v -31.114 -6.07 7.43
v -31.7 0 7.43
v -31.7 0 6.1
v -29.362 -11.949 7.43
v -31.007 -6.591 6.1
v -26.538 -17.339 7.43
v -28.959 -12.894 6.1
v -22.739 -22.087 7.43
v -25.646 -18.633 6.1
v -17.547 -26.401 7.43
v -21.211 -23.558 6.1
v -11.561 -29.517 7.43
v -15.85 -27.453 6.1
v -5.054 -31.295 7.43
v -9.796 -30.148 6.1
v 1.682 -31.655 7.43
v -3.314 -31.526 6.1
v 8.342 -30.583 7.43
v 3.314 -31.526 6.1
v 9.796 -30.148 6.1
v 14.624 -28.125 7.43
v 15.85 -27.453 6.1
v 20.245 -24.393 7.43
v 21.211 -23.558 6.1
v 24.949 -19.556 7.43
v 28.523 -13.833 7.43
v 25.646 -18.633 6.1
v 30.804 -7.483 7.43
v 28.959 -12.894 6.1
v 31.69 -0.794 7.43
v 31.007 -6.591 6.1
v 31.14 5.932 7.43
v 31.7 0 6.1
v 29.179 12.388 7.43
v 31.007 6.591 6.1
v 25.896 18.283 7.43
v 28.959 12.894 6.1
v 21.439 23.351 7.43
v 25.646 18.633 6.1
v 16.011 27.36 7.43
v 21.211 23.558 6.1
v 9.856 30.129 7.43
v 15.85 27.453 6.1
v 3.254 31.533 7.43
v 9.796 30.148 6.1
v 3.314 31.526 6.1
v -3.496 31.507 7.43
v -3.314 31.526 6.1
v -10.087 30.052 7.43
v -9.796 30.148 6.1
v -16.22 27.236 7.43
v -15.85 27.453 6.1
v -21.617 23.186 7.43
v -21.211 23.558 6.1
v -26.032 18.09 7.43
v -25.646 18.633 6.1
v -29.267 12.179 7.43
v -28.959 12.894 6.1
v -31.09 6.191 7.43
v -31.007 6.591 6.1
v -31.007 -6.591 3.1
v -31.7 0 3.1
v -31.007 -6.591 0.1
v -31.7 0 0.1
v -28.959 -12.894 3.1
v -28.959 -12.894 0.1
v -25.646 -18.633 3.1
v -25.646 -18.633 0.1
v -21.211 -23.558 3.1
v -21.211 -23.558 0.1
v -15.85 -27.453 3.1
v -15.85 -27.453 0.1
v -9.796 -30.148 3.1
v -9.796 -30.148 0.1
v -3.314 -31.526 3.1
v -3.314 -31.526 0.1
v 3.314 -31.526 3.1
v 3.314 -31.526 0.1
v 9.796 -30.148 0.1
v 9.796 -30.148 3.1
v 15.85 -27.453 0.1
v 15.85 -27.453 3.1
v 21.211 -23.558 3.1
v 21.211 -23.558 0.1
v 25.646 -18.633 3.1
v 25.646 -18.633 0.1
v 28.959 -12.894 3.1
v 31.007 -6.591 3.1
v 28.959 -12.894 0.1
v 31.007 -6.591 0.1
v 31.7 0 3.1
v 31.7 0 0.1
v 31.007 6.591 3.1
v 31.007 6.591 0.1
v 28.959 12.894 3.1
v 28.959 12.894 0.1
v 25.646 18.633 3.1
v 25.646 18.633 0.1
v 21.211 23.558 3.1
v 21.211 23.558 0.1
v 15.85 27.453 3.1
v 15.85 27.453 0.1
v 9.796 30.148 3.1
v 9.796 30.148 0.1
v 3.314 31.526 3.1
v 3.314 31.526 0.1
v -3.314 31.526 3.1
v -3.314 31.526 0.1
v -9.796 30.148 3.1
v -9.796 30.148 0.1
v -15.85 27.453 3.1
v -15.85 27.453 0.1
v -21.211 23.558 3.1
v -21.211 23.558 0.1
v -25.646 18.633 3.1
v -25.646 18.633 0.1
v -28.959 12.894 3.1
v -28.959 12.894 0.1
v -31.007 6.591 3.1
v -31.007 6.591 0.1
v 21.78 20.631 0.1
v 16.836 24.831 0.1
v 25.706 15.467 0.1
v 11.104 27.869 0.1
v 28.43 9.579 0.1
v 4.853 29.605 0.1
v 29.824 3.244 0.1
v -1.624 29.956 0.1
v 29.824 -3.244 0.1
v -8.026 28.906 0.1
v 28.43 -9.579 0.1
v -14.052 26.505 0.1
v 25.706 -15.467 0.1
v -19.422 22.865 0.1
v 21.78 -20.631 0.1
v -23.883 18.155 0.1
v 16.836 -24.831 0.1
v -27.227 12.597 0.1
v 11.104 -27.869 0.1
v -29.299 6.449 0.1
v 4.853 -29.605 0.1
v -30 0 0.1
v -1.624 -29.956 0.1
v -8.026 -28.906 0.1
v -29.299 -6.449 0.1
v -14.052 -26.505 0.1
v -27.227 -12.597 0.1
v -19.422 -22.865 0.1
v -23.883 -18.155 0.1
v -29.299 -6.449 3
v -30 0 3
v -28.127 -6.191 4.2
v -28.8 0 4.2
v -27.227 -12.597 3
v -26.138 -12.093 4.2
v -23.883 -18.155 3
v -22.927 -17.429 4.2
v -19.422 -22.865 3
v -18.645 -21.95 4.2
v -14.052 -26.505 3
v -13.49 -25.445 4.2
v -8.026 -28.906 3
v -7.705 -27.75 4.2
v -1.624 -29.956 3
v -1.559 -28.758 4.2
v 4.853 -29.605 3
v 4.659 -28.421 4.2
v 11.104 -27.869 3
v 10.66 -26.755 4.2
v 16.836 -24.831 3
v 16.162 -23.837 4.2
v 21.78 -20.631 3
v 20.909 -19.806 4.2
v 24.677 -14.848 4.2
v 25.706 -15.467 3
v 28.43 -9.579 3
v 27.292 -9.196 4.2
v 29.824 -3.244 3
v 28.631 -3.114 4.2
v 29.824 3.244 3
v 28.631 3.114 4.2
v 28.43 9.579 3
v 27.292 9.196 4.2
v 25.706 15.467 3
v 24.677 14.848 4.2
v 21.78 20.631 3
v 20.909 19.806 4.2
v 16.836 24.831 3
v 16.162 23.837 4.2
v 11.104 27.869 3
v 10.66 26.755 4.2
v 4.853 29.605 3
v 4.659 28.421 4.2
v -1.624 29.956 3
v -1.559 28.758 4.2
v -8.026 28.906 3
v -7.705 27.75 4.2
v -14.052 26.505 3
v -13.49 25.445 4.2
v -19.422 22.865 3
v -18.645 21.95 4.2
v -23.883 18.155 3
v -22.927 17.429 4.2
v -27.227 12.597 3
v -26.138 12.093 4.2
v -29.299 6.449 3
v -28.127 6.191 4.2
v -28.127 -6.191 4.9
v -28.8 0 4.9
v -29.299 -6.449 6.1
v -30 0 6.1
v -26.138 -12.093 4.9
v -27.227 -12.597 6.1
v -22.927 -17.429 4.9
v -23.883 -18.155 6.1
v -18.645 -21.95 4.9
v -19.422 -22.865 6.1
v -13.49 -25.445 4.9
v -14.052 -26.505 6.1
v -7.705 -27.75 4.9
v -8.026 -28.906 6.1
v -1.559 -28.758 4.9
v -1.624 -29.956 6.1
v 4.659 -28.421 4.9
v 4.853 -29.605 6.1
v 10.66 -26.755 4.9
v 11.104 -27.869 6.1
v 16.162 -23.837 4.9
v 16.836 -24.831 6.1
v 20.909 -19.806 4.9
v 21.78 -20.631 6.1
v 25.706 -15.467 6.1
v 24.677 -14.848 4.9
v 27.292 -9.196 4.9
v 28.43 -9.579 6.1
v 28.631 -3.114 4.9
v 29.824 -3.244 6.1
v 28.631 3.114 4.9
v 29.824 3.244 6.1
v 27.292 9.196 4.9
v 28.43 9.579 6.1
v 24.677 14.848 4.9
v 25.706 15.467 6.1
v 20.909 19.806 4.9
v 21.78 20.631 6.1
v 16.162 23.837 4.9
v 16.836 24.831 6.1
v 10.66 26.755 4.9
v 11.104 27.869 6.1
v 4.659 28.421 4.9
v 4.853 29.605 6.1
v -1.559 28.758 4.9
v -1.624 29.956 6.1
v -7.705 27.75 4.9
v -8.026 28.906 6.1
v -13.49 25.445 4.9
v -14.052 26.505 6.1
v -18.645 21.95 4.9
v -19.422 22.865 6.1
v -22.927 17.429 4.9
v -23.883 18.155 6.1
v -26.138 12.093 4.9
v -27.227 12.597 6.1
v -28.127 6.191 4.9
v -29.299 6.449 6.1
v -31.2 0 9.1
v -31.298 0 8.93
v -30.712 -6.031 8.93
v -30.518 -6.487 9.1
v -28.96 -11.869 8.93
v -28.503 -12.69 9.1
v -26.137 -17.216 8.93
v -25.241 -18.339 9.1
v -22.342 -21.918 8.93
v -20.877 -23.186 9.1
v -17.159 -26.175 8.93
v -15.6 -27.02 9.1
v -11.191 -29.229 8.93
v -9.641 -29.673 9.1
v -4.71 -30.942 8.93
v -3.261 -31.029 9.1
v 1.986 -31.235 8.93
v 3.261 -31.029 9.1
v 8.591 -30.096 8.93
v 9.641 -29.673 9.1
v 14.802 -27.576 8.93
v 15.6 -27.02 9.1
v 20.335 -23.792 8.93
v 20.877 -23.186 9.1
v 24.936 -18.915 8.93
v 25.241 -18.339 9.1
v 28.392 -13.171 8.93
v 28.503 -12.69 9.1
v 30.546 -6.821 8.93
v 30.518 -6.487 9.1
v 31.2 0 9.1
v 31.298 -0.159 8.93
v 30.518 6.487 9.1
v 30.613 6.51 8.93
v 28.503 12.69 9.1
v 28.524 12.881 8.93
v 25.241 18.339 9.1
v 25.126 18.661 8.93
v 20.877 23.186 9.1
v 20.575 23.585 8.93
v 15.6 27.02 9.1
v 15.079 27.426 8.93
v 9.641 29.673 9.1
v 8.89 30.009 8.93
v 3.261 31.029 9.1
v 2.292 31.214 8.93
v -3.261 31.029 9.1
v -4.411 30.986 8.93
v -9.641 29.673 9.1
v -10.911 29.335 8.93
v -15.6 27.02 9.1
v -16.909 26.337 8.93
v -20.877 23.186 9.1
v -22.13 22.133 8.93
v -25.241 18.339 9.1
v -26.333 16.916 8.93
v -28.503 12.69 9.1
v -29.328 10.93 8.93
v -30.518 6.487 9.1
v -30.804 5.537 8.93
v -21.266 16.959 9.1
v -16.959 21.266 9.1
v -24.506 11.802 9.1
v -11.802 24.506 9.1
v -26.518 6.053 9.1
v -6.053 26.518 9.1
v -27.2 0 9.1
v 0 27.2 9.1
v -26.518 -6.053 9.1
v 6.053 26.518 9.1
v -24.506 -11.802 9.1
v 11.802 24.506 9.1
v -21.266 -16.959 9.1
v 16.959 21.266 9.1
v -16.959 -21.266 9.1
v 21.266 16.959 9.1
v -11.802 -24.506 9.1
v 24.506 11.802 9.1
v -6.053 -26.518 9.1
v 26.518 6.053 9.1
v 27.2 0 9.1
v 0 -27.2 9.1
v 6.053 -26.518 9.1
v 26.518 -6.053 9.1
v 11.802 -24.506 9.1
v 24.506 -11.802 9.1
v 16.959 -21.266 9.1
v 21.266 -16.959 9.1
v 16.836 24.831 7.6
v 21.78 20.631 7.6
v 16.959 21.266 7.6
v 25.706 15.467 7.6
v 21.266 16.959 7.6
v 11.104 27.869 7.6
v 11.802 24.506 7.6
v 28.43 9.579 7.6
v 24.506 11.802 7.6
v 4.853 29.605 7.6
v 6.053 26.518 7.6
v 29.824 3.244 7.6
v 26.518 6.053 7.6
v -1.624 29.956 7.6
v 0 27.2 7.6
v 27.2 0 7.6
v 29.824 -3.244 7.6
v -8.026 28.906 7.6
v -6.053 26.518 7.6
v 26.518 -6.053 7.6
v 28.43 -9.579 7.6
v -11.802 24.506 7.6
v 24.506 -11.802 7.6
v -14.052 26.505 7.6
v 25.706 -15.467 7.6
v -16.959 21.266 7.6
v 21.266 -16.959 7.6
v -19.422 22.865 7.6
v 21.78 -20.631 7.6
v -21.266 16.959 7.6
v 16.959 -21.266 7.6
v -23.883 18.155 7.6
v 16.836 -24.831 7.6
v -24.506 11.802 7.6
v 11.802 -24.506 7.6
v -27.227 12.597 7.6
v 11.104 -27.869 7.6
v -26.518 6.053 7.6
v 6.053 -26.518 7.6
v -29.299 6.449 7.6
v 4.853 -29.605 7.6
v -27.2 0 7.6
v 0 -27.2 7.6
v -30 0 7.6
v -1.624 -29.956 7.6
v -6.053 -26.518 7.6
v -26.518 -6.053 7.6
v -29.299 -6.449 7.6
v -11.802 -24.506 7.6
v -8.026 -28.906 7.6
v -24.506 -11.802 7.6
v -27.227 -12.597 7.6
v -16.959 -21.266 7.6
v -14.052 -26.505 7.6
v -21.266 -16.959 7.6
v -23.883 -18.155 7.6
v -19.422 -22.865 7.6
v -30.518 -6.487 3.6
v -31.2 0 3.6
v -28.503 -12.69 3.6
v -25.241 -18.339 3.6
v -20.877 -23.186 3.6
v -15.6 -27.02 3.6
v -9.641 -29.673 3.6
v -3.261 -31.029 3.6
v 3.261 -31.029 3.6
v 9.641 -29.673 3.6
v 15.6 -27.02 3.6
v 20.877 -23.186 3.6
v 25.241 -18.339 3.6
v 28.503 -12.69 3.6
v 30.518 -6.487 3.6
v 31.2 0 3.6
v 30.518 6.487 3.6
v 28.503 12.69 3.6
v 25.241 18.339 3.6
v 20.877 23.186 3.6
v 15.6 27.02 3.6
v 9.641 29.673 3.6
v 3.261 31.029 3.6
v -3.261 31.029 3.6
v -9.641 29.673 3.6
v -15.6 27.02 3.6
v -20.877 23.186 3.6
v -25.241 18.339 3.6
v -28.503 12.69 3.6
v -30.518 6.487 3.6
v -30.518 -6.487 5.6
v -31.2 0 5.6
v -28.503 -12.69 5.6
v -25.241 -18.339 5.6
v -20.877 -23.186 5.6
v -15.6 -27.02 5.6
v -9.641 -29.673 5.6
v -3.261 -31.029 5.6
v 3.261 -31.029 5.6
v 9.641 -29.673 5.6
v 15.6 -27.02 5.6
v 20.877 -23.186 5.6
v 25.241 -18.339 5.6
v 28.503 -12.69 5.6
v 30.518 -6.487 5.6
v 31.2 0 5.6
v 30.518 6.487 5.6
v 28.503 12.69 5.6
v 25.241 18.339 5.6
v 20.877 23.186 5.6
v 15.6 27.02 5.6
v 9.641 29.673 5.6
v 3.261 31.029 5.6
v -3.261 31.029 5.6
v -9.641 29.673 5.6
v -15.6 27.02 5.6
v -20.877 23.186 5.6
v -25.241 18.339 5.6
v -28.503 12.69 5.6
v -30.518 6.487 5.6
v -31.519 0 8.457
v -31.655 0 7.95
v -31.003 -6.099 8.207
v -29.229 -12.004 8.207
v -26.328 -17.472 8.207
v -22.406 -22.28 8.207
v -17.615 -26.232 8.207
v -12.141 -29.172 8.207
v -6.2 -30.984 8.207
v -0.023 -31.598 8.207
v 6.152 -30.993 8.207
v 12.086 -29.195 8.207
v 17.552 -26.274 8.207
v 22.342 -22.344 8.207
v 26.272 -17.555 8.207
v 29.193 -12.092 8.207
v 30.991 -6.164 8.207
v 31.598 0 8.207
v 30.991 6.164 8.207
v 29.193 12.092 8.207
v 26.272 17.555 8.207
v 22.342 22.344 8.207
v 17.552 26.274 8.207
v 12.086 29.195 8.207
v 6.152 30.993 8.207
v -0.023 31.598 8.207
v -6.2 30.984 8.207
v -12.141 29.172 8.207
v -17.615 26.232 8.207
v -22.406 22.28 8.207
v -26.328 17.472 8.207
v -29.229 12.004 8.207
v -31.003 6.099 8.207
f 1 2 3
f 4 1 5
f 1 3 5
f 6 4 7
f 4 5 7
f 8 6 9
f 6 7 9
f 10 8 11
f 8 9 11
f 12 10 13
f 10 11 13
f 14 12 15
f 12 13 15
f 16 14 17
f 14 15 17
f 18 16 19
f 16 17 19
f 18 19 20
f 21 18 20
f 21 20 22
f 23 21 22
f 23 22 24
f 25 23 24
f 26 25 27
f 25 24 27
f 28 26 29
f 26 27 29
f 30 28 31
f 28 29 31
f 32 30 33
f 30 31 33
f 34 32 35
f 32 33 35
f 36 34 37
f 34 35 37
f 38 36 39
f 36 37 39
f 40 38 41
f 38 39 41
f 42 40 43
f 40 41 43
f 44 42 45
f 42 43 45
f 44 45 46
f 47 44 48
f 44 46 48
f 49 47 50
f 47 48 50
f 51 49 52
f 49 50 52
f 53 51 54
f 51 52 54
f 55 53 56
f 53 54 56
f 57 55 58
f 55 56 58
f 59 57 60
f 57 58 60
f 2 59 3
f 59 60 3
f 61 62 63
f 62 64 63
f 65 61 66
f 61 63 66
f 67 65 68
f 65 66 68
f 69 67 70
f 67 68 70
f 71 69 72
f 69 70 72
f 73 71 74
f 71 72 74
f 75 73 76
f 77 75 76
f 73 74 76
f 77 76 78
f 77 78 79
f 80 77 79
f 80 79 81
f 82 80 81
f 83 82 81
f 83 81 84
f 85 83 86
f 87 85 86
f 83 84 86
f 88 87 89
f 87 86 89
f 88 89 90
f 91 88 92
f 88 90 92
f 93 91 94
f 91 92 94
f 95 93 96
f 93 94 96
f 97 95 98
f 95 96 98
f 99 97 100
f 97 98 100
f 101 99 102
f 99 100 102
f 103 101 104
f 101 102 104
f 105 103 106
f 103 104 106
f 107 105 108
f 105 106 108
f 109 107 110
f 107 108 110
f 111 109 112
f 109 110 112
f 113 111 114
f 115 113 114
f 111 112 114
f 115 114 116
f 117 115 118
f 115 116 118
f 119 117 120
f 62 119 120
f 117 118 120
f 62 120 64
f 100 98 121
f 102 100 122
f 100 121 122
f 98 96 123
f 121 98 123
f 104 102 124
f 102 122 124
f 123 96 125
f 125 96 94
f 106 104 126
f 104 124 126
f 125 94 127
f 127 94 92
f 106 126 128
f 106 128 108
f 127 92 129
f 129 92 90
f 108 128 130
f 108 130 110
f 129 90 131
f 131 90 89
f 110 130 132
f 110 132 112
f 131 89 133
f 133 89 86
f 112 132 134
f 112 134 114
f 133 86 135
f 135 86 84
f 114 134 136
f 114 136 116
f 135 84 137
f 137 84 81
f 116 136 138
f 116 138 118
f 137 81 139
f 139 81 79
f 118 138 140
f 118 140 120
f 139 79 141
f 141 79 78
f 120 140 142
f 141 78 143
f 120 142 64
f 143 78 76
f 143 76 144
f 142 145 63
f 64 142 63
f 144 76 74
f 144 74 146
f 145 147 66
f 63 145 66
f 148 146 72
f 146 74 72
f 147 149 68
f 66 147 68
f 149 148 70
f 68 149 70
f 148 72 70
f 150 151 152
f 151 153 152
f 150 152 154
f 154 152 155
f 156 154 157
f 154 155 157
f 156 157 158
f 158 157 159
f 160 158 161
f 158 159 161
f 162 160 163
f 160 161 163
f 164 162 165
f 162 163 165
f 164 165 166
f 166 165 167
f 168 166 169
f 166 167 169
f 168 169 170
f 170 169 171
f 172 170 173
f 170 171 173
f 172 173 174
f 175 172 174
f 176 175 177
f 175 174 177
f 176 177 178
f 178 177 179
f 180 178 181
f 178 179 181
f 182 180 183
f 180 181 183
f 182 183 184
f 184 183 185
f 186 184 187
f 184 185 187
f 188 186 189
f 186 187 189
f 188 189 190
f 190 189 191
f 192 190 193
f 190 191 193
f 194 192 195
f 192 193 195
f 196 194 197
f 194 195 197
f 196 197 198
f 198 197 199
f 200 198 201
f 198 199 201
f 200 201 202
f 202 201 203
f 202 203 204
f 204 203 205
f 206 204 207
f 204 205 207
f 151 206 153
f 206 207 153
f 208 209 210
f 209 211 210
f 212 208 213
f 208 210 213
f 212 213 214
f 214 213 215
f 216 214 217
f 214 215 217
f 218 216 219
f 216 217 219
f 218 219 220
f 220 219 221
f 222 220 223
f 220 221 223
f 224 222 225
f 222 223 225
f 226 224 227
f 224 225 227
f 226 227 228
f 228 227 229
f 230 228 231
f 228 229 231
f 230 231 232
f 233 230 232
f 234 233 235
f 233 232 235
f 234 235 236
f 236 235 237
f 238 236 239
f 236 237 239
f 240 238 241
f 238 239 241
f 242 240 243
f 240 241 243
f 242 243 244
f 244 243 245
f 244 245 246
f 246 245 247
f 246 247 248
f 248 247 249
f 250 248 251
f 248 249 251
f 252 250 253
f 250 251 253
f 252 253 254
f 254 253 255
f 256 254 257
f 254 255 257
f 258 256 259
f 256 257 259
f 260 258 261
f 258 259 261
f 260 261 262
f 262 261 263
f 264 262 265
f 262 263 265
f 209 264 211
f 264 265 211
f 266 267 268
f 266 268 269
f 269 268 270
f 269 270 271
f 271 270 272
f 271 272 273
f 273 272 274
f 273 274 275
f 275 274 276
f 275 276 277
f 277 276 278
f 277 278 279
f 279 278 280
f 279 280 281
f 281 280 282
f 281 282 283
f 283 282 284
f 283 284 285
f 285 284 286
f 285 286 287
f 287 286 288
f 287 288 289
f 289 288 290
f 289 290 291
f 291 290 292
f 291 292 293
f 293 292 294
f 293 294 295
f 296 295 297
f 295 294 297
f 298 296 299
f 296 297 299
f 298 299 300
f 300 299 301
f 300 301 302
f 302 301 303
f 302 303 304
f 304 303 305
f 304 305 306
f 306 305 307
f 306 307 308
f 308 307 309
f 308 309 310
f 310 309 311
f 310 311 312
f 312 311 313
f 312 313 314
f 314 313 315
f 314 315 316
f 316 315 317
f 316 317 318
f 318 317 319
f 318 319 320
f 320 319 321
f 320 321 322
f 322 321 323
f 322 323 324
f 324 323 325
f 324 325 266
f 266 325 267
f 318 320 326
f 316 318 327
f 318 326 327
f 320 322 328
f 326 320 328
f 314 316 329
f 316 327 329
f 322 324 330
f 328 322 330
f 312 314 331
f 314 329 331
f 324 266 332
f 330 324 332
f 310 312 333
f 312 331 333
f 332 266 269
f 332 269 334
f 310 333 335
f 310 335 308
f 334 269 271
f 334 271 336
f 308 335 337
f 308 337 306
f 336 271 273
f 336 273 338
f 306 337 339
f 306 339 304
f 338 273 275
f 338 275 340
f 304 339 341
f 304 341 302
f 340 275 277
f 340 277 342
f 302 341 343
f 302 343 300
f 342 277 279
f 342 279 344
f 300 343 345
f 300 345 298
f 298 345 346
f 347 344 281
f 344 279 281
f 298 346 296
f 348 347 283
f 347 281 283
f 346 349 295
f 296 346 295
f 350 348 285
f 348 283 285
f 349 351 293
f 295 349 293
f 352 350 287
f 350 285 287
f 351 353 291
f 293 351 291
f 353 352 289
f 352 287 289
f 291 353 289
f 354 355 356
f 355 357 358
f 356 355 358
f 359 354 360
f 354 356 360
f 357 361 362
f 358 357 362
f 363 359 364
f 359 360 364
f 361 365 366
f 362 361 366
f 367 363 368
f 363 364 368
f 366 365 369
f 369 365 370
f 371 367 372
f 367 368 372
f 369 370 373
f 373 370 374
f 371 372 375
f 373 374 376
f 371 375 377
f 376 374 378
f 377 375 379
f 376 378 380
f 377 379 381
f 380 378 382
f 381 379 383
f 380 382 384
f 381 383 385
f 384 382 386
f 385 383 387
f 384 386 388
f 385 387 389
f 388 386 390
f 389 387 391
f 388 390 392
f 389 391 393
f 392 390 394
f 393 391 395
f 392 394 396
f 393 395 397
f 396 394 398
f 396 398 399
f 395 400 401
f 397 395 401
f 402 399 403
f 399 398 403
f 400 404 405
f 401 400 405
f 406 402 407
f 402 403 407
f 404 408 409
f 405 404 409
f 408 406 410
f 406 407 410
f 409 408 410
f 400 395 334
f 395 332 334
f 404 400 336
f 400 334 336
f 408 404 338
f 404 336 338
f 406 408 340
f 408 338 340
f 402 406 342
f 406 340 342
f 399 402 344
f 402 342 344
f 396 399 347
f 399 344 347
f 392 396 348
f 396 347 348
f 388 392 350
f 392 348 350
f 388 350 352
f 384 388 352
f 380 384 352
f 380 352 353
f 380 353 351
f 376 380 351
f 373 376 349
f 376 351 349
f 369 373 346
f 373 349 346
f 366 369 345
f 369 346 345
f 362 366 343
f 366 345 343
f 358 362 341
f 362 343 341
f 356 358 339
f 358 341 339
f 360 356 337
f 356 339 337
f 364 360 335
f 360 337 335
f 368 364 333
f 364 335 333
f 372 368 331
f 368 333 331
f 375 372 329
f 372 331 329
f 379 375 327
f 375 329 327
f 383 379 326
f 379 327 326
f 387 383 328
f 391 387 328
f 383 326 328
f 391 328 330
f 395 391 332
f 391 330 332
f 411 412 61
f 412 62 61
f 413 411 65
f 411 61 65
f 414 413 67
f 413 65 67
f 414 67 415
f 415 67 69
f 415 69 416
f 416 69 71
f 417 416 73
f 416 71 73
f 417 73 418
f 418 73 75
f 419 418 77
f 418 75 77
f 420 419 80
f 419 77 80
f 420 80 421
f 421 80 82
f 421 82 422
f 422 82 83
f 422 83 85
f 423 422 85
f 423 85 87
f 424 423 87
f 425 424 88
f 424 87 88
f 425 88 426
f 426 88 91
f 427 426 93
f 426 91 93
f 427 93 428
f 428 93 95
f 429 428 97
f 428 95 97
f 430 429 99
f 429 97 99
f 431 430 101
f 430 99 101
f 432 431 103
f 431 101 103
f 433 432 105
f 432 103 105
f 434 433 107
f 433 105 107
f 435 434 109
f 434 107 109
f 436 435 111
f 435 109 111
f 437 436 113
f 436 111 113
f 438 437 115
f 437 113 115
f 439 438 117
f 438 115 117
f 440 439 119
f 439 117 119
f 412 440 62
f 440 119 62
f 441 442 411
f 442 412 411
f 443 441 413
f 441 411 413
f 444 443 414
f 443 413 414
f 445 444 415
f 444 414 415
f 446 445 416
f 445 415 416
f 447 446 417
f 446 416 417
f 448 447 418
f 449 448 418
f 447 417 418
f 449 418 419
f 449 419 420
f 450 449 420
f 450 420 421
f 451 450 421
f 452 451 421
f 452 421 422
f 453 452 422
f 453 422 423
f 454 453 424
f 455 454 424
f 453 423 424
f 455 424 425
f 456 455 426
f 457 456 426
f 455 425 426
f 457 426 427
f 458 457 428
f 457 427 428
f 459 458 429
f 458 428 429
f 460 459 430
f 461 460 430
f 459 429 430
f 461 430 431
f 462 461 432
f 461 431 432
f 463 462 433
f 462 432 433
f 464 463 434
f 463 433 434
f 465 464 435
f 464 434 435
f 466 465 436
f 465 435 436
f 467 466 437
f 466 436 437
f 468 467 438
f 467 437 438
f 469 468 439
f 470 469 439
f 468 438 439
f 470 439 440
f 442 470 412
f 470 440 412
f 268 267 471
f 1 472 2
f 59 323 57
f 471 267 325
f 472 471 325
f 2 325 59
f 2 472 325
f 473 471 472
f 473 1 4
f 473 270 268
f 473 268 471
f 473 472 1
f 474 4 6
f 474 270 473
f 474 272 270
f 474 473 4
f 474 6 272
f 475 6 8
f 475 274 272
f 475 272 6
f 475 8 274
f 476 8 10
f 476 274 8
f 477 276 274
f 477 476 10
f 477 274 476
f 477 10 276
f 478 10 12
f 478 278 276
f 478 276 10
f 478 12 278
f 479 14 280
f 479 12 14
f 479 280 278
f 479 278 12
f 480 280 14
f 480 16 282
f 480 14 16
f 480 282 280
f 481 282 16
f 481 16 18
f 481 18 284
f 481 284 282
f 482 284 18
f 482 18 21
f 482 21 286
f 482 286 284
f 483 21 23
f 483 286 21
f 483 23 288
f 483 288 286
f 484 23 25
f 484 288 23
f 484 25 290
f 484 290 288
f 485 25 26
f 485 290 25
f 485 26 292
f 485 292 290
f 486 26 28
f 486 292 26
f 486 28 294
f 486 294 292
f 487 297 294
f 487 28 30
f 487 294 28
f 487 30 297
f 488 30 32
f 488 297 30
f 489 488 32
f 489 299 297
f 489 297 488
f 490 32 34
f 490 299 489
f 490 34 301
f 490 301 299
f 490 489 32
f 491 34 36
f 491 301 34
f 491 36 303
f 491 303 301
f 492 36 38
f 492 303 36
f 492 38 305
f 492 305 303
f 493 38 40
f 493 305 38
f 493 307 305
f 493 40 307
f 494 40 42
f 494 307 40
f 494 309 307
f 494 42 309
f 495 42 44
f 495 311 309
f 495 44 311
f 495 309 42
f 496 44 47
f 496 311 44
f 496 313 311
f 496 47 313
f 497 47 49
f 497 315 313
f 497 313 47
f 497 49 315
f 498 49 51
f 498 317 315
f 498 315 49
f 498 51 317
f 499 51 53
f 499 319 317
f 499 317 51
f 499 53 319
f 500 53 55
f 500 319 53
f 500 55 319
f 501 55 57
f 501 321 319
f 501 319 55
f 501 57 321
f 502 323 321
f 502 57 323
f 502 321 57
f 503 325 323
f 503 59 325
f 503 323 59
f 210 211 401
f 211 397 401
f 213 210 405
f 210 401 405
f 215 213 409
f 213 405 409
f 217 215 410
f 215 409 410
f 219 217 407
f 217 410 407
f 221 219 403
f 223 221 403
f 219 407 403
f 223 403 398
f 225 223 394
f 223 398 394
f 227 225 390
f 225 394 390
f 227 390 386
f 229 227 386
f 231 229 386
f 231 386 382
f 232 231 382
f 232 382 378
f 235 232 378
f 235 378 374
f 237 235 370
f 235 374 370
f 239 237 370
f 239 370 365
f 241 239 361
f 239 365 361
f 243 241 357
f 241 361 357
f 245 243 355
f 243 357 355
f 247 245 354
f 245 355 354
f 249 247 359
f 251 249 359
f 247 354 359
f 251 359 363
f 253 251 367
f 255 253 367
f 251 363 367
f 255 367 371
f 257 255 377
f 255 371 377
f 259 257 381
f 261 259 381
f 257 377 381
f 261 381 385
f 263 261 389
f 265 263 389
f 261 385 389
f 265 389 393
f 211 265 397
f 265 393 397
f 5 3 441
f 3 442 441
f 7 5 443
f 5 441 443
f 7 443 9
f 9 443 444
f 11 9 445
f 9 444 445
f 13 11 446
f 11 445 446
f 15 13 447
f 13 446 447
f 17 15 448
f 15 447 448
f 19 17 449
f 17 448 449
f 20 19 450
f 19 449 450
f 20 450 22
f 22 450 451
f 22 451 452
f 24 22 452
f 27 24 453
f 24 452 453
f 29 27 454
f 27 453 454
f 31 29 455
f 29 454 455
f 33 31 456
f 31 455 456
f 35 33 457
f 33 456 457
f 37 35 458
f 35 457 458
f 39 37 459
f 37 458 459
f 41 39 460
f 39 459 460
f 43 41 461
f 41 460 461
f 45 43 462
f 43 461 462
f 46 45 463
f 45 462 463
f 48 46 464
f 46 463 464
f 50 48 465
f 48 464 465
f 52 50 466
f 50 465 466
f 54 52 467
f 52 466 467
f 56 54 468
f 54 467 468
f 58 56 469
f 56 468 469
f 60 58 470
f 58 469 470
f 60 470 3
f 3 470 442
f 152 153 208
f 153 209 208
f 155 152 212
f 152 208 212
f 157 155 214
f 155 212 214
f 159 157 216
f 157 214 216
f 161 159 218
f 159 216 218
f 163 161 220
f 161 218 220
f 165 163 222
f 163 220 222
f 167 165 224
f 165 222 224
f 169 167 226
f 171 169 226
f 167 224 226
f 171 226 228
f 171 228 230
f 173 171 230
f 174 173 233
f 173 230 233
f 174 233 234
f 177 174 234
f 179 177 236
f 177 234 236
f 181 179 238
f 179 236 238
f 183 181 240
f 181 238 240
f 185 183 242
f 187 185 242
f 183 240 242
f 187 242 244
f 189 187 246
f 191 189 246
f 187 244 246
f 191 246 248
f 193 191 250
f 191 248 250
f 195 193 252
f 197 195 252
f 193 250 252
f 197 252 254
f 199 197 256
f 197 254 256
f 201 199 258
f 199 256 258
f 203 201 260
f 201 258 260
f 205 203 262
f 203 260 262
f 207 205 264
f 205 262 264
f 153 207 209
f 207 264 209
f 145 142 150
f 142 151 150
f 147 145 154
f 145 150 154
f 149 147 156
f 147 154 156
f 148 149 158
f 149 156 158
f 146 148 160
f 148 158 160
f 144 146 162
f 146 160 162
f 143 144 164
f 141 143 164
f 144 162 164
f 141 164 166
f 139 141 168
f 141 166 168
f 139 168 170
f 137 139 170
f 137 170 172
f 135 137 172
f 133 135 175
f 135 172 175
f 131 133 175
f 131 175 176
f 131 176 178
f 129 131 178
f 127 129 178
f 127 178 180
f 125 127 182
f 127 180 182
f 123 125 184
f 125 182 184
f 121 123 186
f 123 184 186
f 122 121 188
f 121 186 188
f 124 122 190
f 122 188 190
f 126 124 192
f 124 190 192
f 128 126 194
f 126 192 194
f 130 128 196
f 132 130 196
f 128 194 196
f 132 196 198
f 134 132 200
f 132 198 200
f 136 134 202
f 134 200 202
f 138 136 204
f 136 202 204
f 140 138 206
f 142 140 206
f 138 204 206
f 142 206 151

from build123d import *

# Parameters (mm, degrees)
F2_R = 3


# Not quite as in the source:
# - a feature names something its author has since deleted; it is built from what else it names


with BuildPart() as f1:
    # F0 (on Front) → F1 (revolve)
    with BuildSketch(Plane.XZ):
        Polygon((-30, 0.1), (-30, 3), (-28.8, 4.2), (-28.8, 4.9), (-30, 6.1), (-30, 7.6), (-27.2, 7.6), (-27.2, 9.1), (-31.2, 9.1), (-31.7, 8.2339745962), (-31.7, 6.1), (-31.2, 5.6), (-31.2, 3.6), (-31.7, 3.1), (-31.7, 0.1), align=None)
    revolve(axis=Axis((0, 0, 8.878365159), (0, 0, 1)))

    # F2
    f2_edges = [f1.edges().sort_by_distance(p)[0] for p in [
        (31.7, 0, 8.233975),
    ]]
    fillet(f2_edges, radius=F2_R)


solid = f1.part
